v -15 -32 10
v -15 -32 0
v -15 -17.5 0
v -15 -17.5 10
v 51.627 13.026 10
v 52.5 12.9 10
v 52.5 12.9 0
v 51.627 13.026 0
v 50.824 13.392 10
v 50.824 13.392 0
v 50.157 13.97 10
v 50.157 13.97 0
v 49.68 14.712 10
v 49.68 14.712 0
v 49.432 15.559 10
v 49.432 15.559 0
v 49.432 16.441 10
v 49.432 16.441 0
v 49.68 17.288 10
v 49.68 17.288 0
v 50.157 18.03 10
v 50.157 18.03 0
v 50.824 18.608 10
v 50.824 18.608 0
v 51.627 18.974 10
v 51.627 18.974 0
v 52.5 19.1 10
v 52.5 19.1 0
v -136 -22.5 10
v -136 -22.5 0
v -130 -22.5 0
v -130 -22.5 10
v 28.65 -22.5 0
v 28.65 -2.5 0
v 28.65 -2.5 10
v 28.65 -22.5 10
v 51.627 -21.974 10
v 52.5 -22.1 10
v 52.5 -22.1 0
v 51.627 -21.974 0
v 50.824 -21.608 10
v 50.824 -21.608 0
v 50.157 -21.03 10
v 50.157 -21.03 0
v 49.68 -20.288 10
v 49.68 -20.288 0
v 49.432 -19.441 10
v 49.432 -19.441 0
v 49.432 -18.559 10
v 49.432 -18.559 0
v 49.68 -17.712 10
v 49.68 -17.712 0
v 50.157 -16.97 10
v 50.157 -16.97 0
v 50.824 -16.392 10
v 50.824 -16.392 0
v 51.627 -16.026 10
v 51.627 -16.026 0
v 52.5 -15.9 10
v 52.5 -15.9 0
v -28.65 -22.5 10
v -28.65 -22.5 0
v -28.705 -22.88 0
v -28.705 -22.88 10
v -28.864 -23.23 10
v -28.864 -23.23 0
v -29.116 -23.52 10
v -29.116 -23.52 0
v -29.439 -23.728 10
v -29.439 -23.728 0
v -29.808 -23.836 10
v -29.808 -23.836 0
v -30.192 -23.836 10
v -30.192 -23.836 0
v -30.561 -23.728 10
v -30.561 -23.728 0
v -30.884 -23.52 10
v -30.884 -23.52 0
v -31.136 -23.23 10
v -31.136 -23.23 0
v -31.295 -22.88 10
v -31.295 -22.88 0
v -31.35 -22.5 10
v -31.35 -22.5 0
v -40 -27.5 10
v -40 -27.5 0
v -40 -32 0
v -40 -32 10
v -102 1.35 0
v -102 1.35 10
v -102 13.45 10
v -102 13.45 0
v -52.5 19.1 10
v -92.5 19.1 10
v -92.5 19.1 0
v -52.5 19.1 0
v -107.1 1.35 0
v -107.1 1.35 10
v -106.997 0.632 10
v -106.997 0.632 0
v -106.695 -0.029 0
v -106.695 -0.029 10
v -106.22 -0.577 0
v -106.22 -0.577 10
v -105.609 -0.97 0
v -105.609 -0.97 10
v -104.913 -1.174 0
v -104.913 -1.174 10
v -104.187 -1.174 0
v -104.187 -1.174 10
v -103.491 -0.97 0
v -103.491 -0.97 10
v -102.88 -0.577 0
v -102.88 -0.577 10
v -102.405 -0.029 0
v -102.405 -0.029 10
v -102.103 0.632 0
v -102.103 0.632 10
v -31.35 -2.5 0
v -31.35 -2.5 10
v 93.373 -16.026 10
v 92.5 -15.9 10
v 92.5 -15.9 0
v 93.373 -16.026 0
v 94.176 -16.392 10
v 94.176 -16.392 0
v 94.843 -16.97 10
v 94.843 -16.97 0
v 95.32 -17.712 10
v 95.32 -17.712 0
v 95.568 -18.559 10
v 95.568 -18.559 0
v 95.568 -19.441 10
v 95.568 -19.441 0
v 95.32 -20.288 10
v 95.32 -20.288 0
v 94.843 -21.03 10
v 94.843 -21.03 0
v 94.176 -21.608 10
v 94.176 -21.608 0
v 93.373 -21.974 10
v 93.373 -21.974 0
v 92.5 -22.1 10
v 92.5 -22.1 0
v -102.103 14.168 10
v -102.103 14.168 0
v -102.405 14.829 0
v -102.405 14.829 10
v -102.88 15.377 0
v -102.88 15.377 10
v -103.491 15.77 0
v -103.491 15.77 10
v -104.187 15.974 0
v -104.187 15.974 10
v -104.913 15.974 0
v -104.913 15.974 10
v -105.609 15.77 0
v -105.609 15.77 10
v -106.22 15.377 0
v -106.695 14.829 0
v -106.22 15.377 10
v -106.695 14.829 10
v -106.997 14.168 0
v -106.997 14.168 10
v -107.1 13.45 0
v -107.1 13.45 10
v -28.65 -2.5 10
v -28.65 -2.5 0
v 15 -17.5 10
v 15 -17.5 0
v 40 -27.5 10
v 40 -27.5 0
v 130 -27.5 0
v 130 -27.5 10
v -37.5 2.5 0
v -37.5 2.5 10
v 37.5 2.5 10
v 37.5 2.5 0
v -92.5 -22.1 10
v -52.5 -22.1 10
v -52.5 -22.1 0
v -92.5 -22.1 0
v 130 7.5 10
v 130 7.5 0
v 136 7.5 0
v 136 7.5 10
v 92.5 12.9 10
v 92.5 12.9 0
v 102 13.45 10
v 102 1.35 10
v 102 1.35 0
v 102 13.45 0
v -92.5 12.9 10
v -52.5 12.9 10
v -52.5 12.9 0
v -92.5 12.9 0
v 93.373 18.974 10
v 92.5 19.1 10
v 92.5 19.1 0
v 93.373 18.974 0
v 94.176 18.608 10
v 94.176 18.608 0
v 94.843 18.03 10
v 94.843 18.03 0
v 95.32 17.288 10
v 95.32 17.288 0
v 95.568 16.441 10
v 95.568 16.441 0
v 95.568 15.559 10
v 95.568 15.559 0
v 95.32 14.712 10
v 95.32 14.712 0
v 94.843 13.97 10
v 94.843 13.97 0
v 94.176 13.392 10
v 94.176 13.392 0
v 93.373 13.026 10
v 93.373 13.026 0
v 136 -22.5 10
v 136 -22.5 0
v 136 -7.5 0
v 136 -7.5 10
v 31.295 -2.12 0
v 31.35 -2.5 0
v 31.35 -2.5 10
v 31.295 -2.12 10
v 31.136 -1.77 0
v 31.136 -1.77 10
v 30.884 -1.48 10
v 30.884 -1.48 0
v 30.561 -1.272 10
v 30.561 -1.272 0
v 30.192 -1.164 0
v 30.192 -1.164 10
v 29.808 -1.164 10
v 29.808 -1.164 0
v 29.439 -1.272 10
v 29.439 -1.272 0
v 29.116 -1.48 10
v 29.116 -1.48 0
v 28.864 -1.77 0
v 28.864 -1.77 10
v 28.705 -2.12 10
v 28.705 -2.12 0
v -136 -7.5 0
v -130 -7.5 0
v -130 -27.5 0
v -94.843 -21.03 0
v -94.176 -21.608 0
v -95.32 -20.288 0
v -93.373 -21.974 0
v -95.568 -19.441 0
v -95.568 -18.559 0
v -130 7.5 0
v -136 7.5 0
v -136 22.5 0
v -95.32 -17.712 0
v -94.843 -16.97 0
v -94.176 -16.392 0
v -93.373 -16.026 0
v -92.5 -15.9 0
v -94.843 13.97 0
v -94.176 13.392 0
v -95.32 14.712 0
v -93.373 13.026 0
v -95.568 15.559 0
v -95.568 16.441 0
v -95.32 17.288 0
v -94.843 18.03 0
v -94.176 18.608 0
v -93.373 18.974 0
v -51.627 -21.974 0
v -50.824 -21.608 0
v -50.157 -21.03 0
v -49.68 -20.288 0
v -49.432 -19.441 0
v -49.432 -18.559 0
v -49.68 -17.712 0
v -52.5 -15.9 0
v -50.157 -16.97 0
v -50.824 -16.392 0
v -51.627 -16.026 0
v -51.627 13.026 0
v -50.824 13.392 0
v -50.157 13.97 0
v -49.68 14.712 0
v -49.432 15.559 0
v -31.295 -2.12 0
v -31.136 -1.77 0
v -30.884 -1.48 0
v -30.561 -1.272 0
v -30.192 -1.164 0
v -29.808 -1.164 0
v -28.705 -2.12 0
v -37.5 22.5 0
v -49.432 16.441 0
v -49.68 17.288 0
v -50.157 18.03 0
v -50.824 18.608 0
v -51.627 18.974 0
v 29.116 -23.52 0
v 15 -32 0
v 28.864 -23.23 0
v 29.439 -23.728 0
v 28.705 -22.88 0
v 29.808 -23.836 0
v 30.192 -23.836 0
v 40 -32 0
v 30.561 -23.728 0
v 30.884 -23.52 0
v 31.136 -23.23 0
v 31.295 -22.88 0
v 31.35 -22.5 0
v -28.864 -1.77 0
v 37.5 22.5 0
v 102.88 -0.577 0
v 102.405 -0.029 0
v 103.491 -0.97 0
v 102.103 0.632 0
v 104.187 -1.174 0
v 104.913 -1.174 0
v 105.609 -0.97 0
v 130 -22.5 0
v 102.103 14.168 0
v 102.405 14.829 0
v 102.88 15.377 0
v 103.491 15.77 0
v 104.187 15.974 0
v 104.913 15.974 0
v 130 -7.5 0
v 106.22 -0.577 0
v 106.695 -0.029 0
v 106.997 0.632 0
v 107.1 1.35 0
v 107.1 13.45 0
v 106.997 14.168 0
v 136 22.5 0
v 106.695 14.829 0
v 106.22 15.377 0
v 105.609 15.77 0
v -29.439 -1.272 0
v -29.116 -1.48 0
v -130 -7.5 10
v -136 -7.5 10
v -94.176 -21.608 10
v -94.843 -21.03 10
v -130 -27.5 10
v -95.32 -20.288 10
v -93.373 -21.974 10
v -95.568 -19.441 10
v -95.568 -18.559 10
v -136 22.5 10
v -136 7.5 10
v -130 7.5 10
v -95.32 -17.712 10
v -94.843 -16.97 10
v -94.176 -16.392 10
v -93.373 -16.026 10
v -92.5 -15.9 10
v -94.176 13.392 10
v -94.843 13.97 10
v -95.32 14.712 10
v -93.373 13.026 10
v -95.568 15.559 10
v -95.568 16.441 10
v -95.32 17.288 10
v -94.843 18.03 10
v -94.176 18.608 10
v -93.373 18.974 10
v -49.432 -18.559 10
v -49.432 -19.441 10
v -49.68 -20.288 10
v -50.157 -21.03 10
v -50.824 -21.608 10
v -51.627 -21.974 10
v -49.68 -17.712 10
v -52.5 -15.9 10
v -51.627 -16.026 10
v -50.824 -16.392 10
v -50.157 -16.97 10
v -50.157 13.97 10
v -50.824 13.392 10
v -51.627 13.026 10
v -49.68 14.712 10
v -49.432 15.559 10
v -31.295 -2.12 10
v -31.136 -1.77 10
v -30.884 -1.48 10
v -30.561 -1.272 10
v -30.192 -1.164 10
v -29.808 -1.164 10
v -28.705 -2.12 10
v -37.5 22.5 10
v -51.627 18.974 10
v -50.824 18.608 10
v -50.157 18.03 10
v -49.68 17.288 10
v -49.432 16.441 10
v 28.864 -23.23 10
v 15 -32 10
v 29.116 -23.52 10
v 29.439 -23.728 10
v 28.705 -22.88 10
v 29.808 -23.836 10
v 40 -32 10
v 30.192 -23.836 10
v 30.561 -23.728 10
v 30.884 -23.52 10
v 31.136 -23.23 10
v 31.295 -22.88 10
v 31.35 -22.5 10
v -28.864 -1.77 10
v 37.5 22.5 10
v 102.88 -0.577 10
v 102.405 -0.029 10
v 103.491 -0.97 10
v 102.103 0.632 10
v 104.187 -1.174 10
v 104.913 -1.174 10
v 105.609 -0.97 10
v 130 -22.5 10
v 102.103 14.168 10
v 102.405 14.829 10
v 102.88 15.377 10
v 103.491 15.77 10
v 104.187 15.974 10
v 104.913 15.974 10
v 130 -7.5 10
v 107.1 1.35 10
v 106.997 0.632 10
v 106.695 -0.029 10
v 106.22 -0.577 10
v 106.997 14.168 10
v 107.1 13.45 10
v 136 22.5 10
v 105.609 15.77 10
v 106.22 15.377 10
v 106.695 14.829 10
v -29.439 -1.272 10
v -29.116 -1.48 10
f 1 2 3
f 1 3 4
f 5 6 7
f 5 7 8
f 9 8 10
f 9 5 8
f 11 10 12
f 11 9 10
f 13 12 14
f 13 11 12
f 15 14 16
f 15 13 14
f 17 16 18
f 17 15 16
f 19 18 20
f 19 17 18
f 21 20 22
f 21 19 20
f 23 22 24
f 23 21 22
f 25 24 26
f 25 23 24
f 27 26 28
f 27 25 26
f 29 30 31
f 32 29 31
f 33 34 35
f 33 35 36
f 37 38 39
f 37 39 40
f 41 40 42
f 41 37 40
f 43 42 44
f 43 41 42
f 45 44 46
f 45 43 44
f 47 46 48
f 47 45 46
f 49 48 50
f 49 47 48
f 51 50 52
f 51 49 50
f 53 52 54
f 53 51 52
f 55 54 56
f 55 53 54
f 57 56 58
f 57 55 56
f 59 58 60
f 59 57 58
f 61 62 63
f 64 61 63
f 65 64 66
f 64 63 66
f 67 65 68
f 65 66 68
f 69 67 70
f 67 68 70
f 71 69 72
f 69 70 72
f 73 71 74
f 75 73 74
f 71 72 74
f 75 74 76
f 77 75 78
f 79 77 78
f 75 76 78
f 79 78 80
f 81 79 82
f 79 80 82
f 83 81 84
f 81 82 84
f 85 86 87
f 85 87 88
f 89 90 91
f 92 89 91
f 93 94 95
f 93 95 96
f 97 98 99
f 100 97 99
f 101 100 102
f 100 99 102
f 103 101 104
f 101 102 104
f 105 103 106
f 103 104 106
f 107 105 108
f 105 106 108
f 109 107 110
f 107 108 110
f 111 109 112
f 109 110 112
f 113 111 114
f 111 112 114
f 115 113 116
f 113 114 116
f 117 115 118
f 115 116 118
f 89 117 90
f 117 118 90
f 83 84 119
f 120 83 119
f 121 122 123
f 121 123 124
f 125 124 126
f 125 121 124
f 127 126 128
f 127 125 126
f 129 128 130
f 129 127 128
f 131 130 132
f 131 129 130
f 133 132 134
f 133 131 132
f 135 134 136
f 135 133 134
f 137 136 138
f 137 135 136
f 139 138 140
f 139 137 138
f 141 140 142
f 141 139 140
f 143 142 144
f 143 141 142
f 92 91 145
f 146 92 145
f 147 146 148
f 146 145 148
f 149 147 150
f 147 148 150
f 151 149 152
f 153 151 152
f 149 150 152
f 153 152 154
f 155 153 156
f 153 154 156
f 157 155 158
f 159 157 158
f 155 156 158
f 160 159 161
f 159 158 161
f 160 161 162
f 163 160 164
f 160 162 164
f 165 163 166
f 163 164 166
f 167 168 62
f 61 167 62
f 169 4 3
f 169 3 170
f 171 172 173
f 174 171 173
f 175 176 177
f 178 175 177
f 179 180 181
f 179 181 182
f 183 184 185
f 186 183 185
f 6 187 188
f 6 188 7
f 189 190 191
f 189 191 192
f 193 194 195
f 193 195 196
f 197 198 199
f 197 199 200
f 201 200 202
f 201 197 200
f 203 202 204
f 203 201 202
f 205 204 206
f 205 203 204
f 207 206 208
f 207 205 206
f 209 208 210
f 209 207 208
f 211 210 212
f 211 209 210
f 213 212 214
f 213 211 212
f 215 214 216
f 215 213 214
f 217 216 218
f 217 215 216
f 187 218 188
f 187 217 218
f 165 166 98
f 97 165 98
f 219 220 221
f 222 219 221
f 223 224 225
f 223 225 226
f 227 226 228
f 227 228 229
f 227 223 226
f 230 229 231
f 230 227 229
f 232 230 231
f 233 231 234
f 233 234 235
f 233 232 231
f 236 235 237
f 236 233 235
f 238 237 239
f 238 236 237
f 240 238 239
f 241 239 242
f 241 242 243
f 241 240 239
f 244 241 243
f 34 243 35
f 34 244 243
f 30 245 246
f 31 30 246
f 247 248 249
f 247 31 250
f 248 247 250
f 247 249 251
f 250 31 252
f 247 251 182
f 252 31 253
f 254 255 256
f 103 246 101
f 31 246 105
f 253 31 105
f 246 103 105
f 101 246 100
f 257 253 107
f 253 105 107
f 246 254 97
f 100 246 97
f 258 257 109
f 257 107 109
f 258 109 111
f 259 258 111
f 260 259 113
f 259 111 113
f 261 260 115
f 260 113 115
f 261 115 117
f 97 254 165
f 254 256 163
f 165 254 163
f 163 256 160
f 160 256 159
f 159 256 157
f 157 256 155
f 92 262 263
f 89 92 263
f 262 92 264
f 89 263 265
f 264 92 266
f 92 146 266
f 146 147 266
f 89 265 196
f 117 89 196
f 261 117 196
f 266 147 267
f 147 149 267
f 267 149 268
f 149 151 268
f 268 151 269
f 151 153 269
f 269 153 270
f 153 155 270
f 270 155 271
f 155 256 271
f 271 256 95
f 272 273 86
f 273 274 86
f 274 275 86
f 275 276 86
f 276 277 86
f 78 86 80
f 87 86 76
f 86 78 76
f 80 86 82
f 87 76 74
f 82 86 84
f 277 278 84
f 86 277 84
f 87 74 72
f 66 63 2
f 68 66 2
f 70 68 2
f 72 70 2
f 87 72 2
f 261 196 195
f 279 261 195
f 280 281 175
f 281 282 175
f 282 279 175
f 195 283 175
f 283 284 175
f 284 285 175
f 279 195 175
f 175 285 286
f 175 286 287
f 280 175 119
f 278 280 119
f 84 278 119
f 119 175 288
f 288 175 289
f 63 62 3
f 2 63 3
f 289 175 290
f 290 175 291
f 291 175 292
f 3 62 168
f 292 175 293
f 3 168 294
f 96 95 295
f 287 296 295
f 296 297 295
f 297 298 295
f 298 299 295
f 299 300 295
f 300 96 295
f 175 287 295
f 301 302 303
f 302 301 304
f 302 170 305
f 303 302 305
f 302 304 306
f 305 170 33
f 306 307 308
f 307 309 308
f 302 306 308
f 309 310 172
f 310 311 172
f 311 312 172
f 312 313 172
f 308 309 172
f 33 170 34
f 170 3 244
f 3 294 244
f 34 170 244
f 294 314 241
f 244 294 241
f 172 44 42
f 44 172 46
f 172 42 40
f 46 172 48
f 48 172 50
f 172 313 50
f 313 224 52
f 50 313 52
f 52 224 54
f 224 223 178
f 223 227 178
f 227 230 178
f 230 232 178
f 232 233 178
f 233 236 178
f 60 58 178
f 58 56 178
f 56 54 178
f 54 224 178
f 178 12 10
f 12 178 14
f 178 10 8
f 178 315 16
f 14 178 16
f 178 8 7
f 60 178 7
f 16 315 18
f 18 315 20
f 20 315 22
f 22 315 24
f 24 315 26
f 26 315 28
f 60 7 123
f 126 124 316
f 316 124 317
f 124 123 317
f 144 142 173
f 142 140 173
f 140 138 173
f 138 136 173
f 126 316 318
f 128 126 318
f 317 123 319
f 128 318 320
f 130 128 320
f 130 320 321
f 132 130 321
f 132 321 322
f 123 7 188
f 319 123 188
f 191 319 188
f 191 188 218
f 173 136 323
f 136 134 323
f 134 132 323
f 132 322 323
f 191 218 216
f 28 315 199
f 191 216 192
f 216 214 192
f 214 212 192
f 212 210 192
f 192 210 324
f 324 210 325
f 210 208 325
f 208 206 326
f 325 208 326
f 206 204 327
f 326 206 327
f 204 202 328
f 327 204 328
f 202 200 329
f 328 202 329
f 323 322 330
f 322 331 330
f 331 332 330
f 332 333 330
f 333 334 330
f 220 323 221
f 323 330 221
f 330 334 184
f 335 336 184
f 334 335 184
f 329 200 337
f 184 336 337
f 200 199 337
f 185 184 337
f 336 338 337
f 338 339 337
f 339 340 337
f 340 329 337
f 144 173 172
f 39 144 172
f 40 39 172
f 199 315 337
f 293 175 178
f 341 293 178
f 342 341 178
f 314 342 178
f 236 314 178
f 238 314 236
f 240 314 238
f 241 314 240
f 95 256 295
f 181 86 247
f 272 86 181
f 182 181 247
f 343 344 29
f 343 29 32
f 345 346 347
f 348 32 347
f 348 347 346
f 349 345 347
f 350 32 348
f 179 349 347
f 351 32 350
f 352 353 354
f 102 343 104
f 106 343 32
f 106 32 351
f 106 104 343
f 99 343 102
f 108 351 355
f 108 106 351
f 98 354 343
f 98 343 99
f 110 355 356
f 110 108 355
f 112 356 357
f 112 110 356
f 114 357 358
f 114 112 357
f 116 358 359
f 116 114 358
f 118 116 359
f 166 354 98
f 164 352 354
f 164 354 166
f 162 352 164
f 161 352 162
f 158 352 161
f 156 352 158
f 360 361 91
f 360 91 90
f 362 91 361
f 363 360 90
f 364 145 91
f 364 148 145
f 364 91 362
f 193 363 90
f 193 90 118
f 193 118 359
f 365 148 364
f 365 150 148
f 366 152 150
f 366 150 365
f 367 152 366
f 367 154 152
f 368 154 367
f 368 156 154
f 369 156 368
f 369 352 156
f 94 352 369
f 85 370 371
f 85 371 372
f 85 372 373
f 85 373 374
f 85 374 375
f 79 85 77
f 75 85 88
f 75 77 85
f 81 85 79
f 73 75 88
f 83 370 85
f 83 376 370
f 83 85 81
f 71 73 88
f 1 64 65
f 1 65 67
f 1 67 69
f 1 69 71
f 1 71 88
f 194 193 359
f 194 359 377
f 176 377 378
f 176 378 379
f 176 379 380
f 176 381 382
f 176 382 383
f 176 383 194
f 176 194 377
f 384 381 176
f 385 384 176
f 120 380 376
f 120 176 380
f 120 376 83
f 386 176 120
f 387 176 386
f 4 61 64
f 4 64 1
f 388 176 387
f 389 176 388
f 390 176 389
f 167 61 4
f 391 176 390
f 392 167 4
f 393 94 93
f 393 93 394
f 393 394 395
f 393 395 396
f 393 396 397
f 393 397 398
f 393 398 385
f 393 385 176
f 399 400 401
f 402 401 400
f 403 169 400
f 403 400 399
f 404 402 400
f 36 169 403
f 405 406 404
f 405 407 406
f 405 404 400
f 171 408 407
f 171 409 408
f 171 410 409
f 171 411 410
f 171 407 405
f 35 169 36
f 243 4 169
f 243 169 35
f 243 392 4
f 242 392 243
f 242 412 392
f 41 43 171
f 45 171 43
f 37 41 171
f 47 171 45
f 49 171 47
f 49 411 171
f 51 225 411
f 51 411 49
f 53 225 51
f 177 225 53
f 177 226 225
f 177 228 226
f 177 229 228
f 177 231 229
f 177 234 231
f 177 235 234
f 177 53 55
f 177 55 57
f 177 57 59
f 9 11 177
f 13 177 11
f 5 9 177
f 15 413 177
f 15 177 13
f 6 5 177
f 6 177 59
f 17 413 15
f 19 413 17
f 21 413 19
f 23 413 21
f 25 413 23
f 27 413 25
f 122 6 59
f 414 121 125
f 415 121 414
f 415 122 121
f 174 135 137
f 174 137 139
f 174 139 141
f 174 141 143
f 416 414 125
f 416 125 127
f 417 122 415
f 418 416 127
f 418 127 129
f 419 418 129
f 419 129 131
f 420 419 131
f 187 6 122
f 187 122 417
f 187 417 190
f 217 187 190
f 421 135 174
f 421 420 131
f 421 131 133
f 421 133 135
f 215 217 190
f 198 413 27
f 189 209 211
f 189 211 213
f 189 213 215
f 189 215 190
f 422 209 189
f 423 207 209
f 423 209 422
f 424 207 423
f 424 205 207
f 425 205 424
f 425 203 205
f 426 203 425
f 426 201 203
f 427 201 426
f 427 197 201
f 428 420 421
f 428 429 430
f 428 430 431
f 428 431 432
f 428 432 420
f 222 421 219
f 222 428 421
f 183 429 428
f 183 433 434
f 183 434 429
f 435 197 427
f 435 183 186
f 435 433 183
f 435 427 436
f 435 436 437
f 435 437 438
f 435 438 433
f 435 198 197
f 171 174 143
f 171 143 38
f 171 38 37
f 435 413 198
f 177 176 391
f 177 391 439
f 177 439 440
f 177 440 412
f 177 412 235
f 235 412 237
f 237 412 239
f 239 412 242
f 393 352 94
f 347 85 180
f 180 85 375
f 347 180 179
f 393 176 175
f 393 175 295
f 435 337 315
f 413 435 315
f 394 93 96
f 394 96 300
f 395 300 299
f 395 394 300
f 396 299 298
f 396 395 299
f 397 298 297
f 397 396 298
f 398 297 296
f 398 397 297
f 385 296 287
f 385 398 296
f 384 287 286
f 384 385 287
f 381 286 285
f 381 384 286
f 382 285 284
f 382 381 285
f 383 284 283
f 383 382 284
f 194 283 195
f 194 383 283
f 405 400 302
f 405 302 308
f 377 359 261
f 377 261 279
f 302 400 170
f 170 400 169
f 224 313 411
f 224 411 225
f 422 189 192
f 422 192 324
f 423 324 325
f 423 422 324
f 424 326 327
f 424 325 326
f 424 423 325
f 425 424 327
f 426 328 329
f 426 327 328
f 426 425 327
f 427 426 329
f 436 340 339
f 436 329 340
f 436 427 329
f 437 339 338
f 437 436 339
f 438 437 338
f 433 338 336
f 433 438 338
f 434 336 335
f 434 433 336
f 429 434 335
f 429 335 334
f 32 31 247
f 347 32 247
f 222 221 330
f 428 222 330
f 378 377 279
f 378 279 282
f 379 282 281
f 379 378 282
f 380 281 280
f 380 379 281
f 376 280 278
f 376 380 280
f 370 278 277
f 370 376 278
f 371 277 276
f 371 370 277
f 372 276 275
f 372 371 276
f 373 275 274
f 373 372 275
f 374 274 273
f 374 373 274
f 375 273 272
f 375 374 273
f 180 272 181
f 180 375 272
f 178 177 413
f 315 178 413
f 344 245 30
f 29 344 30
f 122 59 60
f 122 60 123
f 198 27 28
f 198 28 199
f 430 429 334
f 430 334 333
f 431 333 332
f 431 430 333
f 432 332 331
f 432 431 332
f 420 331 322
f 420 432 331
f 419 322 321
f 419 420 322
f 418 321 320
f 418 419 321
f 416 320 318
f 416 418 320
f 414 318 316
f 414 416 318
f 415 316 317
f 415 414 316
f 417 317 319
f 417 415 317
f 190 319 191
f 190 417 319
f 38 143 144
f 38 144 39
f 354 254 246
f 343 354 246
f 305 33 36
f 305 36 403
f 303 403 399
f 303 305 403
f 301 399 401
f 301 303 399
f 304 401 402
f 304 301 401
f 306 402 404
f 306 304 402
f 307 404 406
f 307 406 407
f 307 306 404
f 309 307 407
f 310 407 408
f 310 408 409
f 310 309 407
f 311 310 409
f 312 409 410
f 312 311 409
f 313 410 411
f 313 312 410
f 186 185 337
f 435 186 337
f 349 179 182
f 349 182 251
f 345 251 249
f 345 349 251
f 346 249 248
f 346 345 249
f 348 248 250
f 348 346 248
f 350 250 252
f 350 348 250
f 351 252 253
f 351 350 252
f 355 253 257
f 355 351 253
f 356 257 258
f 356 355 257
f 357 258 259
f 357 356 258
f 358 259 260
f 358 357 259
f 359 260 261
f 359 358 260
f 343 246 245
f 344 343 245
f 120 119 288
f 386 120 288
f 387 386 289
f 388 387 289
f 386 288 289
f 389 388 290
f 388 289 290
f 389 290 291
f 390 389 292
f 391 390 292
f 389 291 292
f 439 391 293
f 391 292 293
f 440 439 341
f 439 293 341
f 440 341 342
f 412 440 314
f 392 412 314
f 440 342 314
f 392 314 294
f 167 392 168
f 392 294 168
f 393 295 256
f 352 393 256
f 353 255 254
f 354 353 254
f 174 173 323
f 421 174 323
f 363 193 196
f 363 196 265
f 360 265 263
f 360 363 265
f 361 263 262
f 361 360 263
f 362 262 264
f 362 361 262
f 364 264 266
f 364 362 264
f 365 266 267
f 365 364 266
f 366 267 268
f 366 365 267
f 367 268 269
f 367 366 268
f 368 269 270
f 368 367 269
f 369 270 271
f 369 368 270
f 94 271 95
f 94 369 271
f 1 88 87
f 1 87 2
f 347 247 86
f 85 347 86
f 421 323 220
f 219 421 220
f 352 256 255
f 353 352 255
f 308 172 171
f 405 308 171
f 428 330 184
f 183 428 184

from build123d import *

# Parameters (mm, degrees)
EXTRUDE_1_DEPTH     = 10
CUT_EXTRUDE_1_DEPTH = 140.112364655
SKETCH_3_W          = 30
SKETCH_3_H          = 10
SKETCH_3_W_2        = 75
SKETCH_3_H_2        = 20
CUT_EXTRUDE_2_DEPTH = 140.112364655
SKETCH_4_W          = 25
SKETCH_4_H          = 10
EXTRUDE_2_DEPTH     = 4.5
CUT_EXTRUDE_3_DEPTH = 141.071410359


with BuildPart() as part:
    # 草圖1 → 填料-伸長1 (new body)
    with BuildSketch(Plane.XY):
        Polygon((136, -22.5), (136, -7.5), (130, -7.5), (130, 7.5), (136, 7.5), (136, 22.5), (-136, 22.5), (-136, 7.5), (-130, 7.5), (-130, -7.5), (-136, -7.5), (-136, -22.5), (-130, -22.5), (-130, -27.5), (130, -27.5), (130, -22.5), align=None)
        with BuildLine():
            Line((-31.35, -22.5), (-31.35, -2.5))
            ThreePointArc((-31.35, -2.5), (-30, -1.15), (-28.65, -2.5))
            Line((-28.65, -2.5), (-28.65, -22.5))
            ThreePointArc((-28.65, -22.5), (-30, -23.85), (-31.35, -22.5))
        make_face(mode=Mode.SUBTRACT)
        with BuildLine():
            Line((31.35, -22.5), (31.35, -2.5))
            ThreePointArc((31.35, -2.5), (30, -1.15), (28.65, -2.5))
            Line((28.65, -2.5), (28.65, -22.5))
            ThreePointArc((28.65, -22.5), (30, -23.85), (31.35, -22.5))
        make_face(mode=Mode.SUBTRACT)
    extrude(amount=EXTRUDE_1_DEPTH)

    # 草圖2 → 除料-伸長1 (cut, through all)
    with BuildSketch(Plane.XY.offset(10)):
        with BuildLine():
            Line((-92.5, 19.1), (-52.5, 19.1))
            ThreePointArc((-52.5, 19.1), (-49.4, 16), (-52.5, 12.9))
            Line((-52.5, 12.9), (-92.5, 12.9))
            ThreePointArc((-92.5, 12.9), (-95.6, 16), (-92.5, 19.1))
        make_face()
        with BuildLine():
            Line((-92.5, -15.9), (-52.5, -15.9))
            ThreePointArc((-52.5, -15.9), (-49.4, -19), (-52.5, -22.1))
            Line((-52.5, -22.1), (-92.5, -22.1))
            ThreePointArc((-92.5, -22.1), (-95.6, -19), (-92.5, -15.9))
        make_face()
        with BuildLine():
            Line((52.5, 19.1), (92.5, 19.1))
            ThreePointArc((92.5, 19.1), (95.6, 16), (92.5, 12.9))
            Line((92.5, 12.9), (52.5, 12.9))
            ThreePointArc((52.5, 12.9), (49.4, 16), (52.5, 19.1))
        make_face()
        with BuildLine():
            Line((52.5, -15.9), (92.5, -15.9))
            ThreePointArc((92.5, -15.9), (95.6, -19), (92.5, -22.1))
            Line((92.5, -22.1), (52.5, -22.1))
            ThreePointArc((52.5, -22.1), (49.4, -19), (52.5, -15.9))
        make_face()
    extrude(amount=-CUT_EXTRUDE_1_DEPTH, mode=Mode.SUBTRACT)

    # 草圖3 → 除料-伸長2 (cut, through all)
    with BuildSketch(Plane.XY.offset(10)):
        with Locations((0, -22.5)):
            Rectangle(SKETCH_3_W, SKETCH_3_H)
        with Locations((0, 12.5)):
            Rectangle(SKETCH_3_W_2, SKETCH_3_H_2)
    extrude(amount=-CUT_EXTRUDE_2_DEPTH, mode=Mode.SUBTRACT)

    # 草圖4 → 填料-伸長2 (add)
    with BuildSketch(Plane.XZ.offset(27.5)):
        with Locations((-27.5, 5)):
            Rectangle(SKETCH_4_W, SKETCH_4_H)
        with Locations((27.5, 5)):
            Rectangle(SKETCH_4_W, SKETCH_4_H)
    extrude(amount=EXTRUDE_2_DEPTH)

    # 草圖5 → 除料-伸長3 (cut, through all)
    with BuildSketch(Plane.XY.offset(10)):
        with BuildLine():
            Line((-107.1, 13.45), (-107.1, 1.35))
            ThreePointArc((-107.1, 1.35), (-104.55, -1.2), (-102, 1.35))
            Line((-102, 1.35), (-102, 13.45))
            ThreePointArc((-102, 13.45), (-104.55, 16), (-107.1, 13.45))
        make_face()
        with BuildLine():
            Line((107.1, 13.45), (107.1, 1.35))
            ThreePointArc((107.1, 1.35), (104.55, -1.2), (102, 1.35))
            Line((102, 1.35), (102, 13.45))
            ThreePointArc((102, 13.45), (104.55, 16), (107.1, 13.45))
        make_face()
    extrude(amount=-CUT_EXTRUDE_3_DEPTH, mode=Mode.SUBTRACT)


solid = part.part
